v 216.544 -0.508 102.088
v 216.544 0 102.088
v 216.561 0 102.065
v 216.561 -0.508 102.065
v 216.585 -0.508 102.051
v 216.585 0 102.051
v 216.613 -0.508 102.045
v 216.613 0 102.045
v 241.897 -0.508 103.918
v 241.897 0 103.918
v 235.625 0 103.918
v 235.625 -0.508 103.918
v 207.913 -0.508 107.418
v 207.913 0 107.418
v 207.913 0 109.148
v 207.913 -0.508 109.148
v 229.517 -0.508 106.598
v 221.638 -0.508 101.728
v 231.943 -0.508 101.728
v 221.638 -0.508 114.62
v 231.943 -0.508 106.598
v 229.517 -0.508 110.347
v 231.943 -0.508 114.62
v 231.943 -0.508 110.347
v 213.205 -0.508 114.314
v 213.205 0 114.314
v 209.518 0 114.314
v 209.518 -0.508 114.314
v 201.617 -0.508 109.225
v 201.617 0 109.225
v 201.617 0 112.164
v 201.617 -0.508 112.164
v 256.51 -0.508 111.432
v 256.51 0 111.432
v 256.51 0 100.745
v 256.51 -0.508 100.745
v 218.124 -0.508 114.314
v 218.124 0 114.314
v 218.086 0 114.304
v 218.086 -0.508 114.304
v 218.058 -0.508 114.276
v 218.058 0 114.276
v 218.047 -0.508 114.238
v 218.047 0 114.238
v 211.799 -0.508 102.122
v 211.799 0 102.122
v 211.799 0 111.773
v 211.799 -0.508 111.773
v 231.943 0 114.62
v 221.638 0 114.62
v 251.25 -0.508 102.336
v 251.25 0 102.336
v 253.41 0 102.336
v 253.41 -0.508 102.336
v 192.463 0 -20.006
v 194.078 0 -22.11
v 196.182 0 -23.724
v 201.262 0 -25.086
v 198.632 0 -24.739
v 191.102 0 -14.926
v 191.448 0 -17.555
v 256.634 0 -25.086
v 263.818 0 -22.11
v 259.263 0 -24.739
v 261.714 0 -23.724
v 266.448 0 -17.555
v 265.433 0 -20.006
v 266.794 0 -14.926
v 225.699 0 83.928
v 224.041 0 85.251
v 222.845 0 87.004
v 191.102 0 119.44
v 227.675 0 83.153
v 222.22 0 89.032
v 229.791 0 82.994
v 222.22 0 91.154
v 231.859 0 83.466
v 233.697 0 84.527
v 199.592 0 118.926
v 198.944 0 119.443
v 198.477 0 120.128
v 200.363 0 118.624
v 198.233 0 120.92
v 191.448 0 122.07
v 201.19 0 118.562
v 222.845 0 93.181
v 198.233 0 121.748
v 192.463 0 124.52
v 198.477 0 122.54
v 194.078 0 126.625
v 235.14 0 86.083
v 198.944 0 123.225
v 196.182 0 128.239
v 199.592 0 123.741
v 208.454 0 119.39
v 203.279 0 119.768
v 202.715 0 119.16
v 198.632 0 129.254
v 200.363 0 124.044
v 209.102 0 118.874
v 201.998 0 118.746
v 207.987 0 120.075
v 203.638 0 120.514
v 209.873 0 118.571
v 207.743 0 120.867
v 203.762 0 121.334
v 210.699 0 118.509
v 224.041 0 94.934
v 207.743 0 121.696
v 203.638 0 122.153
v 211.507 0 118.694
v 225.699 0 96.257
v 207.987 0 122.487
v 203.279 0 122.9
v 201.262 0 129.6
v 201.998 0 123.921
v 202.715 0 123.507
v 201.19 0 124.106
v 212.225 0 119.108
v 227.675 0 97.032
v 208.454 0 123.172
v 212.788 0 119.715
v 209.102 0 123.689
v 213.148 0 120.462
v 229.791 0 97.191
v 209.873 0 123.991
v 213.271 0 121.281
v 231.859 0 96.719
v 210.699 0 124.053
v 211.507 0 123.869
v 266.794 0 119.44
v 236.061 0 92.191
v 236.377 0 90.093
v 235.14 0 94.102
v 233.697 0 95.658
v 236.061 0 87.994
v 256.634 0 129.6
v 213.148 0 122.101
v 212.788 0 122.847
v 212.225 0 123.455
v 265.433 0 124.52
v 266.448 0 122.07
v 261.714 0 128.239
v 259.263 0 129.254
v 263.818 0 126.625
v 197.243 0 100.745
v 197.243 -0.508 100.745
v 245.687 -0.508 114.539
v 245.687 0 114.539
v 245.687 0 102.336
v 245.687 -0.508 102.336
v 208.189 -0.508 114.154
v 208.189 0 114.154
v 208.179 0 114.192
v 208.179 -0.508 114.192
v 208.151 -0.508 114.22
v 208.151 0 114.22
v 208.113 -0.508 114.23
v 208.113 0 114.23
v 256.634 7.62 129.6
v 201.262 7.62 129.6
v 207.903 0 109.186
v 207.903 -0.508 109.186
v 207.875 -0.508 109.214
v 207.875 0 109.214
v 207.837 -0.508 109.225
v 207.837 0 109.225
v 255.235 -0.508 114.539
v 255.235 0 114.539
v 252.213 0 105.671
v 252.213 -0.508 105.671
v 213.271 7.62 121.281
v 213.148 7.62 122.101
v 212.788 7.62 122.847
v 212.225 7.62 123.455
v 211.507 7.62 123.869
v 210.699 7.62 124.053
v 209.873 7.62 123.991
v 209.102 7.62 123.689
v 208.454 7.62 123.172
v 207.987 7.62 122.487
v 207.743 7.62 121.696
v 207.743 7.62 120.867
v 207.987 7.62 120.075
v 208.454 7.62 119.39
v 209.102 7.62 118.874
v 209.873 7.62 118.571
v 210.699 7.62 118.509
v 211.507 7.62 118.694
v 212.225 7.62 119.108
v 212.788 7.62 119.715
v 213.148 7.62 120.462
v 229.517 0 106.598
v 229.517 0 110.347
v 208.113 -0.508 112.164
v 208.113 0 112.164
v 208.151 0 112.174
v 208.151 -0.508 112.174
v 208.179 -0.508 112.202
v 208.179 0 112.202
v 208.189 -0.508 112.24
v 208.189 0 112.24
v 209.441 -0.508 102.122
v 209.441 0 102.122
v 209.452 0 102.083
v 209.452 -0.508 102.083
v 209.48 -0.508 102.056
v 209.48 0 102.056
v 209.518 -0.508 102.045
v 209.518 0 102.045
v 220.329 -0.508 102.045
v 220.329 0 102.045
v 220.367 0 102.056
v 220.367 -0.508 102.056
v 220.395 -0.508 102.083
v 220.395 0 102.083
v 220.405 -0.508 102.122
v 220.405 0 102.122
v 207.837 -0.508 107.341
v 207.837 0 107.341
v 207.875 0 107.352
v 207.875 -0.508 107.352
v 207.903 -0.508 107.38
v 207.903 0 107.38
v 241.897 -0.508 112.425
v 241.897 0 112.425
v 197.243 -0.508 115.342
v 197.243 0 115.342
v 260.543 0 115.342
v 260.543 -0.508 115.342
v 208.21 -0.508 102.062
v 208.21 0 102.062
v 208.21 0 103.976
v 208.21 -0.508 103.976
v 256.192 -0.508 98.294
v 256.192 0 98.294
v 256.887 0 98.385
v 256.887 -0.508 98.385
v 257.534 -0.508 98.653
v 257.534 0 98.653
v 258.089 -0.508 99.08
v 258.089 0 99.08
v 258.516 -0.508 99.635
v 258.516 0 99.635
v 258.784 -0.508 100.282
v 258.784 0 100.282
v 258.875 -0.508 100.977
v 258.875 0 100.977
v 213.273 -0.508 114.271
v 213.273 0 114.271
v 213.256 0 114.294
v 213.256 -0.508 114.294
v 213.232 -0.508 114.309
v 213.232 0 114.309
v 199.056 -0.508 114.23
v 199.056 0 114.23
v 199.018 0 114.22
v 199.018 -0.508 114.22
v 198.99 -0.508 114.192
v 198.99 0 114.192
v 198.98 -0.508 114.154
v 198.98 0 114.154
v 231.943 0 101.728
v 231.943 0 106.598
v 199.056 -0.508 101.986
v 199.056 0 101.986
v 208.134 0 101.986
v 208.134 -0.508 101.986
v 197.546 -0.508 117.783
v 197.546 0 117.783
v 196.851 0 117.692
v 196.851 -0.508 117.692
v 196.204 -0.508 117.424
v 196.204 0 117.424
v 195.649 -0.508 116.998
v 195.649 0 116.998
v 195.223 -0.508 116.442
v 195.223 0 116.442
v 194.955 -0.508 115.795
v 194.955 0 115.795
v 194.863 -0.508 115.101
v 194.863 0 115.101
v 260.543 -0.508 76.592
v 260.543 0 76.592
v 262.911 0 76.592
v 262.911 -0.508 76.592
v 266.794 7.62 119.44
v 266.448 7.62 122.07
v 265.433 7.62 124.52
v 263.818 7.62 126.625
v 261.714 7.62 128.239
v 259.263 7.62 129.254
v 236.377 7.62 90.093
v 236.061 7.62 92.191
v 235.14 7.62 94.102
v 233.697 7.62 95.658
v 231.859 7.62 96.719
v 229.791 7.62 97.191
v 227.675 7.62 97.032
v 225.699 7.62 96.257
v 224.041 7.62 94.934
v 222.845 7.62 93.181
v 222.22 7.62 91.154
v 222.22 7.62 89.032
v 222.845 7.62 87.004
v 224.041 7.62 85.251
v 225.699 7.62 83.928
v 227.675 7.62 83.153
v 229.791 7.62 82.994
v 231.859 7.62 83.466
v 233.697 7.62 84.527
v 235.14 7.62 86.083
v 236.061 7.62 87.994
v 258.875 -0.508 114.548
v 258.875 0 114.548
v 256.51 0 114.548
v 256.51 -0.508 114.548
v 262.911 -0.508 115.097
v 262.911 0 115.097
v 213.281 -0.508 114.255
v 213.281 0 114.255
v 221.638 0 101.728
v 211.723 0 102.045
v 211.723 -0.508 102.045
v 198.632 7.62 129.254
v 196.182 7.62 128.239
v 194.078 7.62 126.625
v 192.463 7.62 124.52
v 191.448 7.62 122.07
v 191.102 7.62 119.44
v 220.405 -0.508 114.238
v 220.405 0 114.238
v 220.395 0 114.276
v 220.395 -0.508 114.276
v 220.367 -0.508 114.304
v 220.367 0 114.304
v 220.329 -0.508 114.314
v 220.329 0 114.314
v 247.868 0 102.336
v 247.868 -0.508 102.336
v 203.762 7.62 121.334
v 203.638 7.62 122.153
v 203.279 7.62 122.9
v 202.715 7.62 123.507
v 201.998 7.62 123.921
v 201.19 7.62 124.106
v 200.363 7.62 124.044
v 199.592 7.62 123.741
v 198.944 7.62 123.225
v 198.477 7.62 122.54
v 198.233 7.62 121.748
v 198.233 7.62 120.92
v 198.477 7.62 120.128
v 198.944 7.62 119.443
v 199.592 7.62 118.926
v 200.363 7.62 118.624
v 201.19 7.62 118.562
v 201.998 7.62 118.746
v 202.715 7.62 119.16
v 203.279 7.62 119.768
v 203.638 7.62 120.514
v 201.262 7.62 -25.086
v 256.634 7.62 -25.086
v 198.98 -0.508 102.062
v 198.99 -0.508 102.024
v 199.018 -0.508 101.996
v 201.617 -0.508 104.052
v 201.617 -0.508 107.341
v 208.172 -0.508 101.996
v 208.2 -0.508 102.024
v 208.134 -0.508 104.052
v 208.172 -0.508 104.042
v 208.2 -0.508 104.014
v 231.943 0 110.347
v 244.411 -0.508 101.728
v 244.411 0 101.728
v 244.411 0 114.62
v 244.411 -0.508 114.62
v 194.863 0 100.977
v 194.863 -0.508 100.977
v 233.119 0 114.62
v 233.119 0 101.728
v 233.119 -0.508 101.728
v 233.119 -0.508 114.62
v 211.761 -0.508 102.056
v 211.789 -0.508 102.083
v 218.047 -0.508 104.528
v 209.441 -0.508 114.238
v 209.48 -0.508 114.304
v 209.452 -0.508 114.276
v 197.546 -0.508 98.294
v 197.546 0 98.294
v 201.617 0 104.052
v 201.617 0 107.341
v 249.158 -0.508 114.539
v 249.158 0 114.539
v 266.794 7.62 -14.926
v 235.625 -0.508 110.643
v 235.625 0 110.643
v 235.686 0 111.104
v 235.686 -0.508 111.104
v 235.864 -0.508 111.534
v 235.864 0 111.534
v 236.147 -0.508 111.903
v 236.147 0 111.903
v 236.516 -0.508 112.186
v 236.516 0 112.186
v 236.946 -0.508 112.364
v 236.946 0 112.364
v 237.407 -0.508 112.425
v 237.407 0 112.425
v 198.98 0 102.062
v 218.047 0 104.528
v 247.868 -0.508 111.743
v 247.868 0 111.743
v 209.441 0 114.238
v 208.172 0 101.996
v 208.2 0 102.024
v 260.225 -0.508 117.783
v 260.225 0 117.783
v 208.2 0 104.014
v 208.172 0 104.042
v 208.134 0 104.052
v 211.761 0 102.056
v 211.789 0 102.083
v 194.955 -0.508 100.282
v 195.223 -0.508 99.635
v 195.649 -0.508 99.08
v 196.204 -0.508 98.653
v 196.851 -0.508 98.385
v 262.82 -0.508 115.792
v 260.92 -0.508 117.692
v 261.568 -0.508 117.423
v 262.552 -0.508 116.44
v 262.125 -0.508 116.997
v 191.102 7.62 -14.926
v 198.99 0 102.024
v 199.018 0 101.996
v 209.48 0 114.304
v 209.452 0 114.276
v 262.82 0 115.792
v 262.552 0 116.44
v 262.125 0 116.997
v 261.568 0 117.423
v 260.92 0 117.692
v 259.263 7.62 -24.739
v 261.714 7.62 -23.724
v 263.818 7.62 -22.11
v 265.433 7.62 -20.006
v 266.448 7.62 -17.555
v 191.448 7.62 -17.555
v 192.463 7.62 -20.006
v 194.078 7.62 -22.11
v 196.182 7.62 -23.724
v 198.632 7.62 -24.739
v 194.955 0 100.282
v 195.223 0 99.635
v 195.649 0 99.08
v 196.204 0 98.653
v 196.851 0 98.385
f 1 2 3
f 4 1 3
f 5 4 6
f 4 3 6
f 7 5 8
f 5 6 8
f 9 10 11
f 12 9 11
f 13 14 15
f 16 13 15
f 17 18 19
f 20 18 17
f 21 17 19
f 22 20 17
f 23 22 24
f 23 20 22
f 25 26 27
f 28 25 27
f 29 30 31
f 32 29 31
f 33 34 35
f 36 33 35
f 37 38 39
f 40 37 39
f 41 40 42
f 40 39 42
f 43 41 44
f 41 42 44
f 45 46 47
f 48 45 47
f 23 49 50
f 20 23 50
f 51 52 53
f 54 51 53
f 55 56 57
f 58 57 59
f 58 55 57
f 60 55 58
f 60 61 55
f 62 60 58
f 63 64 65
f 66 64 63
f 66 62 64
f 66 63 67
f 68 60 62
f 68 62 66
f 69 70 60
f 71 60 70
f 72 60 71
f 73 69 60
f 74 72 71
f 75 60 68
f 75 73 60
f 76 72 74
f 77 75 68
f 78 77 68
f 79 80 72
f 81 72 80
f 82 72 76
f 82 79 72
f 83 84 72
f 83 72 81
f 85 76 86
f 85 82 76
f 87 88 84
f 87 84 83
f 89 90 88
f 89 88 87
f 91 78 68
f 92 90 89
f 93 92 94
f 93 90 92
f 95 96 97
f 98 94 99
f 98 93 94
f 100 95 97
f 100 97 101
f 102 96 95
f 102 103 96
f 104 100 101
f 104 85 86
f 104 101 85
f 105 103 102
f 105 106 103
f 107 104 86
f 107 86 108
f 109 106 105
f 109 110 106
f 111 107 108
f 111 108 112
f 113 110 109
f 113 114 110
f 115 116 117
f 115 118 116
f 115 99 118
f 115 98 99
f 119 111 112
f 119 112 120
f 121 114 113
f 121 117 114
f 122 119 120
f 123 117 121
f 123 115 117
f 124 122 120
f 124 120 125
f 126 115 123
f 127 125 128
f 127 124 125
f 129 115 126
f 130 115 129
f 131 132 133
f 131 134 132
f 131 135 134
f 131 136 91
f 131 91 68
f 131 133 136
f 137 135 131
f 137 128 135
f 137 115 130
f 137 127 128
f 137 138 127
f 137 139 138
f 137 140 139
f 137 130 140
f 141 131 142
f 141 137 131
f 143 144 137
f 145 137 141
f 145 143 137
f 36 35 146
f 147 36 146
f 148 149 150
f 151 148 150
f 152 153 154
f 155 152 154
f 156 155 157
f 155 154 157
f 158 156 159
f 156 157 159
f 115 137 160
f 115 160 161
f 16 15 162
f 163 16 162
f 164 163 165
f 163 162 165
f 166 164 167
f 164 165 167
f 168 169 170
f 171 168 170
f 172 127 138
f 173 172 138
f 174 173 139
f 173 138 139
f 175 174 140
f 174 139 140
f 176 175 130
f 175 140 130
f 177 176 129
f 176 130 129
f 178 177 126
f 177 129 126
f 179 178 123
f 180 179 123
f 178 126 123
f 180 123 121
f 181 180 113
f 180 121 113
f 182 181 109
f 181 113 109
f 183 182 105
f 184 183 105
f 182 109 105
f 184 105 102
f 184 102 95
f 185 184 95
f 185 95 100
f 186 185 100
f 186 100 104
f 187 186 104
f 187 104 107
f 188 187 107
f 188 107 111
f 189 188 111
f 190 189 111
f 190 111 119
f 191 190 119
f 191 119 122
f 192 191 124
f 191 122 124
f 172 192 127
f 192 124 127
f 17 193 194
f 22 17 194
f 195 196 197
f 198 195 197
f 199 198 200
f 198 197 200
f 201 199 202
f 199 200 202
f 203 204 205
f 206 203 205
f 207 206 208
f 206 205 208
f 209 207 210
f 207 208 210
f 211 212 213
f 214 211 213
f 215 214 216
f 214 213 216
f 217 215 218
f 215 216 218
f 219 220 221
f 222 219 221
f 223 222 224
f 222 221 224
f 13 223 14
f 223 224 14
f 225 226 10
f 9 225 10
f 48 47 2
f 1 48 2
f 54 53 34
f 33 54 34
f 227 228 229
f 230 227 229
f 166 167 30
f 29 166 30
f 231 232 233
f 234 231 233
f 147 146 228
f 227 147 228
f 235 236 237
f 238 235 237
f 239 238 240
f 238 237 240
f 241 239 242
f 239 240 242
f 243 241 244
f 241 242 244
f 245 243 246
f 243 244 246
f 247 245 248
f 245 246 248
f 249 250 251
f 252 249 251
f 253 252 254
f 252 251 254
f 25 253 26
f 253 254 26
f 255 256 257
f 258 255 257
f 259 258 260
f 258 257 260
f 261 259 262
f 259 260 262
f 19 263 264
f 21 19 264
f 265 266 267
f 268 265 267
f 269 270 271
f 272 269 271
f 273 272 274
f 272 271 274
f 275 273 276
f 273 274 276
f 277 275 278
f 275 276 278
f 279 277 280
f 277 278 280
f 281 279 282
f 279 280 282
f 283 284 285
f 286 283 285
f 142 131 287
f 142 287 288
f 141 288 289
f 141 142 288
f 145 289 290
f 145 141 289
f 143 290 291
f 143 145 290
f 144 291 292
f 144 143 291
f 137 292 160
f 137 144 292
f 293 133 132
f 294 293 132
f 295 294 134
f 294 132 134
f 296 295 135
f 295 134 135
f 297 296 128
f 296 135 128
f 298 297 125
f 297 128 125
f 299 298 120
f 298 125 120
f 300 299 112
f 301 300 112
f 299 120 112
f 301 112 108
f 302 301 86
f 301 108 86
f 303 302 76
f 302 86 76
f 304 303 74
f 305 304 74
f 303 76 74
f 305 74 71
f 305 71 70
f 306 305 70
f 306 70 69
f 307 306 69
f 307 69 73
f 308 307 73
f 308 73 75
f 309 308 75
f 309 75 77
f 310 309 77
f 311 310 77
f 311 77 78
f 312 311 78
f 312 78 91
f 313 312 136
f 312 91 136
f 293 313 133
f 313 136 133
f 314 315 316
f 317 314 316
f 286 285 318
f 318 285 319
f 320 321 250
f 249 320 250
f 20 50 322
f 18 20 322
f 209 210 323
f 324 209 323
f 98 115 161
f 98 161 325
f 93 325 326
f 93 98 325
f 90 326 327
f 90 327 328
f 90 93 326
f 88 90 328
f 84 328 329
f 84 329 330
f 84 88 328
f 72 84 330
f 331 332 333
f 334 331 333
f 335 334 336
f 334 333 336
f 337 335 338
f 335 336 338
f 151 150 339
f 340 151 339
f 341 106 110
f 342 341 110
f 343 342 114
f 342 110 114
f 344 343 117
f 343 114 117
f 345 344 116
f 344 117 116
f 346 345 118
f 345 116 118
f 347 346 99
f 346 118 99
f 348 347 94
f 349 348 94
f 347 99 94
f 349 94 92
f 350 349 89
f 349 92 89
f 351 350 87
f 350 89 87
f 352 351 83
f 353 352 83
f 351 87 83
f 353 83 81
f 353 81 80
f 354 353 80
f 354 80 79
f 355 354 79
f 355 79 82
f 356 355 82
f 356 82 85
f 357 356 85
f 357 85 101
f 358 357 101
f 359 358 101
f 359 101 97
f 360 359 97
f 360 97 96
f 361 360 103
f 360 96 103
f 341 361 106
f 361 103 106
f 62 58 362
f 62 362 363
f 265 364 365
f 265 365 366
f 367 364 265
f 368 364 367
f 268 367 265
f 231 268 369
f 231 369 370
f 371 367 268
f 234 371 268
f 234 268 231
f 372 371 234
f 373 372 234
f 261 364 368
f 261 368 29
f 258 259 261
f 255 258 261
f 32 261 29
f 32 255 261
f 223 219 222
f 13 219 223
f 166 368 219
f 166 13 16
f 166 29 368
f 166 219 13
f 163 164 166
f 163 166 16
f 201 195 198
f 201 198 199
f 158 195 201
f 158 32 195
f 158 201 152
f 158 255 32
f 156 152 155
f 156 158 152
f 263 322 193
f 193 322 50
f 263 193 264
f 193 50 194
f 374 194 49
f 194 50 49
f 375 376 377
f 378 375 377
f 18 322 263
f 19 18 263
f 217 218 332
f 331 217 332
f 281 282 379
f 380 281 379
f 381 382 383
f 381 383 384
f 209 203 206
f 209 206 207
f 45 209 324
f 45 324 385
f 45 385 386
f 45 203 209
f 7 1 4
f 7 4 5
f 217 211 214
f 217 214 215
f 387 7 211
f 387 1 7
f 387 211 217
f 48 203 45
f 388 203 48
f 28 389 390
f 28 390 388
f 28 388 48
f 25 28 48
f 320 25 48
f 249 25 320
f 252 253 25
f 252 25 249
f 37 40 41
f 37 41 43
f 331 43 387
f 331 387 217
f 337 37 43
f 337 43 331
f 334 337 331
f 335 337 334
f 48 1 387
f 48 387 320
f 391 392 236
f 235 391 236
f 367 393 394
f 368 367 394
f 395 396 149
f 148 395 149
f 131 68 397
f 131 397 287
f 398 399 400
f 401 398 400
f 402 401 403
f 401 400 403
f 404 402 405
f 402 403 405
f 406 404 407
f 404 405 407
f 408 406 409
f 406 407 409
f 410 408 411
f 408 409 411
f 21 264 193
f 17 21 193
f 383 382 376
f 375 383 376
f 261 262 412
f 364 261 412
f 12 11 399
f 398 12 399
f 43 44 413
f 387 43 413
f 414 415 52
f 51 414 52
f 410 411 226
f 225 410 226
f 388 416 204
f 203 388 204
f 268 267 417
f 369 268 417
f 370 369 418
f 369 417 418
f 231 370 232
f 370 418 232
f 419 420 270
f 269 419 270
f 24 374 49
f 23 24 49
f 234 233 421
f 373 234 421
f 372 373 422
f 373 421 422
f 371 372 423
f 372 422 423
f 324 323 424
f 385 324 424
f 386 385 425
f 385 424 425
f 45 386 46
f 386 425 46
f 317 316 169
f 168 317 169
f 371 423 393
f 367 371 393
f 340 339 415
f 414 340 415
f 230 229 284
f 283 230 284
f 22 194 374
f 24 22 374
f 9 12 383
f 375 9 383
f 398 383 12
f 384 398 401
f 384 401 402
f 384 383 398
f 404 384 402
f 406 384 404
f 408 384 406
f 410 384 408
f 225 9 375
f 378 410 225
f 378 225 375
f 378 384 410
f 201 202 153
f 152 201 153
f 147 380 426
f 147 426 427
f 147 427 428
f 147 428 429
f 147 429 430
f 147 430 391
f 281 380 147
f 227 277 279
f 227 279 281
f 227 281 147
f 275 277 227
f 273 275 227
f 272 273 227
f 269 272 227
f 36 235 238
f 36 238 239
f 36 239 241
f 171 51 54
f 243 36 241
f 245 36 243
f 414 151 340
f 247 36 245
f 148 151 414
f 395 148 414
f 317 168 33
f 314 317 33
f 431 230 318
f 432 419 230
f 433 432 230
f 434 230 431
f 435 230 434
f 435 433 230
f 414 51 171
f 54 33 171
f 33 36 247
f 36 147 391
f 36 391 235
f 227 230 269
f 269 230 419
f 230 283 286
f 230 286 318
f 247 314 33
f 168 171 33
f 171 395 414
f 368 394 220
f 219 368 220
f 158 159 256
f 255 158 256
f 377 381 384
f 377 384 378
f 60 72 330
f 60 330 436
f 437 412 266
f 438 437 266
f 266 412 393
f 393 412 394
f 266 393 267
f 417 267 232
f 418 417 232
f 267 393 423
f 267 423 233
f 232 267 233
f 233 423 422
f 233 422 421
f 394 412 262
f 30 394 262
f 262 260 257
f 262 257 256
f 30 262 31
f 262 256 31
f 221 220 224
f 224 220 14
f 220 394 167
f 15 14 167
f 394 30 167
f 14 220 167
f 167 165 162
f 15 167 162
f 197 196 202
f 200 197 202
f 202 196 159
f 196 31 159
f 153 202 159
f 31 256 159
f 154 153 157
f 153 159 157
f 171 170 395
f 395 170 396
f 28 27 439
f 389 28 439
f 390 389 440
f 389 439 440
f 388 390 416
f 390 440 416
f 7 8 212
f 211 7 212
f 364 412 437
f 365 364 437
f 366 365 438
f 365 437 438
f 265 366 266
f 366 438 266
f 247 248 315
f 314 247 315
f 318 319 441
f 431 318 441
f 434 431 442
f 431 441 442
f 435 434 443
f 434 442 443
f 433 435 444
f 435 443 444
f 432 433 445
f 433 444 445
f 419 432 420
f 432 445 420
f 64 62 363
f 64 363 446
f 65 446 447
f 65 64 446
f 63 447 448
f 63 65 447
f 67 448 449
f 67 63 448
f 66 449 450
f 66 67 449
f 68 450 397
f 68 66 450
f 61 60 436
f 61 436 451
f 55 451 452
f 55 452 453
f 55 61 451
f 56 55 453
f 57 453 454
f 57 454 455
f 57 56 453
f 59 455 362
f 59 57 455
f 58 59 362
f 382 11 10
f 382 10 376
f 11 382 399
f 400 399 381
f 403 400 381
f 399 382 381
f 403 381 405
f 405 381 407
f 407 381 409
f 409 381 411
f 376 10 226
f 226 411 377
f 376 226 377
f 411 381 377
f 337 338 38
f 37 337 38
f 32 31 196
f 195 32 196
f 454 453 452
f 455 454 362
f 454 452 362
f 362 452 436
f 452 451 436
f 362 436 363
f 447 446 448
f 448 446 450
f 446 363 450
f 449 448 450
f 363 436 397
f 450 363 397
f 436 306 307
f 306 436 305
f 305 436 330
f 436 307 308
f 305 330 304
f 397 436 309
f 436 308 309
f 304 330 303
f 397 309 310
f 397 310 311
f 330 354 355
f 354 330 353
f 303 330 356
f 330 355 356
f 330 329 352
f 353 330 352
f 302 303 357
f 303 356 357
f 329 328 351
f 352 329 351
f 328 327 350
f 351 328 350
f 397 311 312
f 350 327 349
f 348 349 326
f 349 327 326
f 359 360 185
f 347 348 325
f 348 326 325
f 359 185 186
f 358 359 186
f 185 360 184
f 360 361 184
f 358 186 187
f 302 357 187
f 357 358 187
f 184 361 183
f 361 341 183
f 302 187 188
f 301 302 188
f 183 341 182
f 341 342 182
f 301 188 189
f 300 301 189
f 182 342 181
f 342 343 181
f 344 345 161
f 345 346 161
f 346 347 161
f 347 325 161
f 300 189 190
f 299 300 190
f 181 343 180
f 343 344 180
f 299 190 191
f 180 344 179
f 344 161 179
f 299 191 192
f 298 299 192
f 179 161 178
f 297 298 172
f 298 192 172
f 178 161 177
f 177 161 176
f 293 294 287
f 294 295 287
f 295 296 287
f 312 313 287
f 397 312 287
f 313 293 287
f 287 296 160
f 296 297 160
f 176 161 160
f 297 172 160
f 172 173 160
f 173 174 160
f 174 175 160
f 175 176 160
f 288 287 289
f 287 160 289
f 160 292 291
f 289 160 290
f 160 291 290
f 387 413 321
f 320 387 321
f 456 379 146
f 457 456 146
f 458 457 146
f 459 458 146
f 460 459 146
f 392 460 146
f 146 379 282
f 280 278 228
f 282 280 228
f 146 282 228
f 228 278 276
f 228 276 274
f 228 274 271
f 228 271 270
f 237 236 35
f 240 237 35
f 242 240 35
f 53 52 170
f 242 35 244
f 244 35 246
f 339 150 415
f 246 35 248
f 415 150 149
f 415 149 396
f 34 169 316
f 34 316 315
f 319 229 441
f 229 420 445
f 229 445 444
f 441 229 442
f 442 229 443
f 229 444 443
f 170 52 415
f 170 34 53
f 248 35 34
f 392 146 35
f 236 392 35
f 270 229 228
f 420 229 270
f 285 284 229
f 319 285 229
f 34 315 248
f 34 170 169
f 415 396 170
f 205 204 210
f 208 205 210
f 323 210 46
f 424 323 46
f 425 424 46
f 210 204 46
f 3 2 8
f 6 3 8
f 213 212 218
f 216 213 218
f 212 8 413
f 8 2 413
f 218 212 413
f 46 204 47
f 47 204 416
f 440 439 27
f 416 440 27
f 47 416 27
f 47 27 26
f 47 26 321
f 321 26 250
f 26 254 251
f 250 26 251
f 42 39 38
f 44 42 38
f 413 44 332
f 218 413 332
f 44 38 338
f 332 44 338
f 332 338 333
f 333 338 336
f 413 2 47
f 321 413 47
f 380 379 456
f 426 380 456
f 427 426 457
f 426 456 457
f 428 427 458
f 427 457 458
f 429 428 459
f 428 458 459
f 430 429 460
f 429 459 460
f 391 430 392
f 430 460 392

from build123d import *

# Parameters (mm, degrees)
F0_R     = 2.77982
F0_R_2   = 7.118321
F0_W     = 68.371698
F0_H     = 20.227566
F2_DEPTH = 7.62
F1_W     = 11.292279
F1_H     = 12.891882
F3_DEPTH = 0.508


with BuildPart() as f2:
    # F0 (on Front) → F2 (new body)
    with BuildSketch(Plane.XZ):
        with BuildLine():
            Line((256.633898, 129.600368), (201.261898, 129.600368))
            ThreePointArc((201.261898, 129.600368), (194.077693, 126.624573), (191.101898, 119.440368))
            Line((191.101898, 119.440368), (191.101898, -14.925632))
            ThreePointArc((191.101898, -14.925632), (194.077693, -22.109837), (201.261898, -25.085632))
            Line((201.261898, -25.085632), (256.633898, -25.085632))
            ThreePointArc((256.633898, -25.085632), (263.818103, -22.109837), (266.793898, -14.925632))
            Line((266.793898, -14.925632), (266.793898, 119.440368))
            ThreePointArc((266.793898, 119.440368), (263.818103, 126.624573), (256.633898, 129.600368))
        make_face()
        with Locations((200.982004, 121.33383)):
            Circle(F0_R, mode=Mode.SUBTRACT)
        with Locations((210.491642, 121.281251)):
            Circle(F0_R, mode=Mode.SUBTRACT)
        with Locations((229.258642, 90.09257)):
            Circle(F0_R_2, mode=Mode.SUBTRACT)
        with Locations((229.013391, 107.724607)):
            Rectangle(F0_W, F0_H, mode=Mode.SUBTRACT)
        with Locations((229.013391, 107.724607)):
            Rectangle(F0_W, F0_H)
    extrude(amount=-F2_DEPTH)


with BuildPart() as f3:
    # F1 (on Front) → F3 (new body)
    with BuildSketch(Plane.XZ):
        with BuildLine():
            Line((201.617226, 114.230096), (199.056099, 114.230096))
            ThreePointArc((199.056099, 114.230096), (199.002218, 114.207778), (198.979899, 114.153896))
            Line((198.979899, 114.153896), (198.979899, 102.062102))
            ThreePointArc((198.979899, 102.062102), (199.002218, 102.00822), (199.056099, 101.985902))
            Line((199.056099, 101.985902), (201.617226, 101.985902))
            Line((201.617226, 101.985902), (201.617226, 104.052089))
            Line((201.617226, 104.052089), (201.617226, 107.341483))
            Line((201.617226, 107.341483), (201.617226, 109.224506))
            Line((201.617226, 109.224506), (201.617226, 112.163909))
            Line((201.617226, 112.163909), (201.617226, 114.230096))
        make_face()
        with BuildLine():
            Line((208.113134, 114.230096), (201.617226, 114.230096))
            Line((201.617226, 114.230096), (201.617226, 112.163909))
            Line((201.617226, 112.163909), (208.113134, 112.163909))
            ThreePointArc((208.113134, 112.163909), (208.167015, 112.186227), (208.189334, 112.240109))
            Line((208.189334, 112.240109), (208.189334, 114.153896))
            ThreePointArc((208.189334, 114.153896), (208.167015, 114.207778), (208.113134, 114.230096))
        make_face()
        with BuildLine():
            Line((207.837288, 109.224506), (201.617226, 109.224506))
            Line((201.617226, 109.224506), (201.617226, 107.341483))
            Line((201.617226, 107.341483), (207.837288, 107.341483))
            ThreePointArc((207.837288, 107.341483), (207.89117, 107.363802), (207.913488, 107.417683))
            Line((207.913488, 107.417683), (207.913488, 109.148306))
            ThreePointArc((207.913488, 109.148306), (207.89117, 109.202187), (207.837288, 109.224506))
        make_face()
        with BuildLine():
            Line((201.617226, 104.052089), (201.617226, 101.985902))
            Line((201.617226, 101.985902), (208.133642, 101.985902))
            ThreePointArc((208.133642, 101.985902), (208.187524, 102.00822), (208.209842, 102.062102))
            Line((208.209842, 102.062102), (208.209842, 103.975889))
            ThreePointArc((208.209842, 103.975889), (208.187524, 104.029771), (208.133642, 104.052089))
            Line((208.133642, 104.052089), (201.617226, 104.052089))
        make_face()
        with BuildLine():
            Line((211.79907, 114.314042), (209.517638, 114.314042))
            ThreePointArc((209.517638, 114.314042), (209.463757, 114.291724), (209.441438, 114.237842))
            Line((209.441438, 114.237842), (209.441438, 102.12152))
            ThreePointArc((209.441438, 102.12152), (209.463757, 102.067638), (209.517638, 102.04532))
            Line((209.517638, 102.04532), (211.72287, 102.04532))
            ThreePointArc((211.72287, 102.04532), (211.776752, 102.067638), (211.79907, 102.12152))
            Line((211.79907, 102.12152), (211.79907, 111.772515))
            Line((211.79907, 111.772515), (211.79907, 114.314042))
        make_face()
        with BuildLine():
            Line((213.204763, 114.314042), (211.79907, 114.314042))
            Line((211.79907, 114.314042), (211.79907, 111.772515))
            Line((211.79907, 111.772515), (216.544224, 102.087992))
            ThreePointArc((216.544224, 102.087992), (216.57233, 102.056862), (216.612651, 102.04532))
            Line((216.612651, 102.04532), (218.04741, 102.04532))
            Line((218.04741, 102.04532), (218.04741, 104.527526))
            Line((218.04741, 104.527526), (213.281348, 114.254721))
            Line((213.281348, 114.254721), (213.273191, 114.27137))
            ThreePointArc((213.273191, 114.27137), (213.245085, 114.3025), (213.204763, 114.314042))
        make_face()
        with BuildLine():
            Line((218.04741, 104.527526), (218.04741, 102.04532))
            Line((218.04741, 102.04532), (220.328842, 102.04532))
            ThreePointArc((220.328842, 102.04532), (220.382724, 102.067638), (220.405042, 102.12152))
            Line((220.405042, 102.12152), (220.405042, 114.237842))
            ThreePointArc((220.405042, 114.237842), (220.382724, 114.291724), (220.328842, 114.314042))
            Line((220.328842, 114.314042), (218.12361, 114.314042))
            ThreePointArc((218.12361, 114.314042), (218.069729, 114.291724), (218.04741, 114.237842))
            Line((218.04741, 114.237842), (218.04741, 104.527526))
        make_face()
        Polygon((231.943071, 114.619859), (221.637994, 114.619859), (221.637994, 101.727977), (231.943071, 101.727977), (231.943071, 106.598198), (229.517043, 106.598198), (229.517043, 110.34707), (231.943071, 110.34707), align=None)
        with Locations((238.764972, 108.173918)):
            Rectangle(F1_W, F1_H)
        with BuildLine():
            ThreePointArc((235.624984, 110.643006), (236.146922, 111.903076), (237.406992, 112.425014))
            Line((237.406992, 112.425014), (241.897196, 112.425014))
            Line((241.897196, 112.425014), (241.897196, 103.917606))
            Line((241.897196, 103.917606), (235.624984, 103.917606))
            Line((235.624984, 103.917606), (235.624984, 110.643006))
        make_face(mode=Mode.SUBTRACT)
        Polygon((247.867972, 102.335535), (247.867972, 111.743048), (247.867972, 114.539206), (245.686665, 114.539206), (245.686665, 102.335535), align=None)
        Polygon((256.510377, 111.432262), (256.510377, 114.548117), (255.23454, 114.539206), (252.212584, 105.671428), (249.157995, 114.539206), (247.867972, 114.539206), (247.867972, 111.743048), (251.249611, 102.335535), (253.4104, 102.335535), align=None)
        with BuildLine():
            Line((258.874923, 117.78339), (197.545778, 117.78339))
            ThreePointArc((197.545778, 117.78339), (195.648846, 116.997655), (194.863111, 115.100722))
            Line((194.863111, 115.100722), (194.863111, 100.976523))
            ThreePointArc((194.863111, 100.976523), (195.648846, 99.079591), (197.545778, 98.293856))
            Line((197.545778, 98.293856), (256.192256, 98.293856))
            ThreePointArc((256.192256, 98.293856), (258.089188, 99.079591), (258.874923, 100.976523))
            Line((258.874923, 100.976523), (258.874923, 114.548117))
            Line((258.874923, 114.548117), (256.510377, 114.548117))
            Line((256.510377, 114.548117), (256.510377, 111.432262))
            Line((256.510377, 111.432262), (256.510377, 100.745179))
            Line((256.510377, 100.745179), (197.24299, 100.745179))
            Line((197.24299, 100.745179), (197.24299, 115.341797))
            Line((197.24299, 115.341797), (256.510377, 115.341797))
            Line((256.510377, 115.341797), (258.874923, 115.341797))
            Line((258.874923, 115.341797), (258.874923, 117.78339))
        make_face()
        with BuildLine():
            Line((260.225059, 117.78339), (258.874923, 117.78339))
            Line((258.874923, 117.78339), (258.874923, 115.341797))
            Line((258.874923, 115.341797), (260.543227, 115.341797))
            Line((260.543227, 115.341797), (260.543227, 114.548117))
            Line((260.543227, 114.548117), (260.543227, 99.643797))
            Line((260.543227, 99.643797), (262.911439, 99.643797))
            Line((262.911439, 99.643797), (262.911439, 115.09701))
            ThreePointArc((262.911439, 115.09701), (262.124616, 116.996567), (260.225059, 117.78339))
        make_face()
        Polygon((262.911439, 76.591752), (262.911439, 99.643797), (260.543227, 99.643797), (260.543227, 98.293856), (260.543227, 76.591752), align=None)
    extrude(amount=F3_DEPTH)


solid = Compound([f2.part, f3.part])
